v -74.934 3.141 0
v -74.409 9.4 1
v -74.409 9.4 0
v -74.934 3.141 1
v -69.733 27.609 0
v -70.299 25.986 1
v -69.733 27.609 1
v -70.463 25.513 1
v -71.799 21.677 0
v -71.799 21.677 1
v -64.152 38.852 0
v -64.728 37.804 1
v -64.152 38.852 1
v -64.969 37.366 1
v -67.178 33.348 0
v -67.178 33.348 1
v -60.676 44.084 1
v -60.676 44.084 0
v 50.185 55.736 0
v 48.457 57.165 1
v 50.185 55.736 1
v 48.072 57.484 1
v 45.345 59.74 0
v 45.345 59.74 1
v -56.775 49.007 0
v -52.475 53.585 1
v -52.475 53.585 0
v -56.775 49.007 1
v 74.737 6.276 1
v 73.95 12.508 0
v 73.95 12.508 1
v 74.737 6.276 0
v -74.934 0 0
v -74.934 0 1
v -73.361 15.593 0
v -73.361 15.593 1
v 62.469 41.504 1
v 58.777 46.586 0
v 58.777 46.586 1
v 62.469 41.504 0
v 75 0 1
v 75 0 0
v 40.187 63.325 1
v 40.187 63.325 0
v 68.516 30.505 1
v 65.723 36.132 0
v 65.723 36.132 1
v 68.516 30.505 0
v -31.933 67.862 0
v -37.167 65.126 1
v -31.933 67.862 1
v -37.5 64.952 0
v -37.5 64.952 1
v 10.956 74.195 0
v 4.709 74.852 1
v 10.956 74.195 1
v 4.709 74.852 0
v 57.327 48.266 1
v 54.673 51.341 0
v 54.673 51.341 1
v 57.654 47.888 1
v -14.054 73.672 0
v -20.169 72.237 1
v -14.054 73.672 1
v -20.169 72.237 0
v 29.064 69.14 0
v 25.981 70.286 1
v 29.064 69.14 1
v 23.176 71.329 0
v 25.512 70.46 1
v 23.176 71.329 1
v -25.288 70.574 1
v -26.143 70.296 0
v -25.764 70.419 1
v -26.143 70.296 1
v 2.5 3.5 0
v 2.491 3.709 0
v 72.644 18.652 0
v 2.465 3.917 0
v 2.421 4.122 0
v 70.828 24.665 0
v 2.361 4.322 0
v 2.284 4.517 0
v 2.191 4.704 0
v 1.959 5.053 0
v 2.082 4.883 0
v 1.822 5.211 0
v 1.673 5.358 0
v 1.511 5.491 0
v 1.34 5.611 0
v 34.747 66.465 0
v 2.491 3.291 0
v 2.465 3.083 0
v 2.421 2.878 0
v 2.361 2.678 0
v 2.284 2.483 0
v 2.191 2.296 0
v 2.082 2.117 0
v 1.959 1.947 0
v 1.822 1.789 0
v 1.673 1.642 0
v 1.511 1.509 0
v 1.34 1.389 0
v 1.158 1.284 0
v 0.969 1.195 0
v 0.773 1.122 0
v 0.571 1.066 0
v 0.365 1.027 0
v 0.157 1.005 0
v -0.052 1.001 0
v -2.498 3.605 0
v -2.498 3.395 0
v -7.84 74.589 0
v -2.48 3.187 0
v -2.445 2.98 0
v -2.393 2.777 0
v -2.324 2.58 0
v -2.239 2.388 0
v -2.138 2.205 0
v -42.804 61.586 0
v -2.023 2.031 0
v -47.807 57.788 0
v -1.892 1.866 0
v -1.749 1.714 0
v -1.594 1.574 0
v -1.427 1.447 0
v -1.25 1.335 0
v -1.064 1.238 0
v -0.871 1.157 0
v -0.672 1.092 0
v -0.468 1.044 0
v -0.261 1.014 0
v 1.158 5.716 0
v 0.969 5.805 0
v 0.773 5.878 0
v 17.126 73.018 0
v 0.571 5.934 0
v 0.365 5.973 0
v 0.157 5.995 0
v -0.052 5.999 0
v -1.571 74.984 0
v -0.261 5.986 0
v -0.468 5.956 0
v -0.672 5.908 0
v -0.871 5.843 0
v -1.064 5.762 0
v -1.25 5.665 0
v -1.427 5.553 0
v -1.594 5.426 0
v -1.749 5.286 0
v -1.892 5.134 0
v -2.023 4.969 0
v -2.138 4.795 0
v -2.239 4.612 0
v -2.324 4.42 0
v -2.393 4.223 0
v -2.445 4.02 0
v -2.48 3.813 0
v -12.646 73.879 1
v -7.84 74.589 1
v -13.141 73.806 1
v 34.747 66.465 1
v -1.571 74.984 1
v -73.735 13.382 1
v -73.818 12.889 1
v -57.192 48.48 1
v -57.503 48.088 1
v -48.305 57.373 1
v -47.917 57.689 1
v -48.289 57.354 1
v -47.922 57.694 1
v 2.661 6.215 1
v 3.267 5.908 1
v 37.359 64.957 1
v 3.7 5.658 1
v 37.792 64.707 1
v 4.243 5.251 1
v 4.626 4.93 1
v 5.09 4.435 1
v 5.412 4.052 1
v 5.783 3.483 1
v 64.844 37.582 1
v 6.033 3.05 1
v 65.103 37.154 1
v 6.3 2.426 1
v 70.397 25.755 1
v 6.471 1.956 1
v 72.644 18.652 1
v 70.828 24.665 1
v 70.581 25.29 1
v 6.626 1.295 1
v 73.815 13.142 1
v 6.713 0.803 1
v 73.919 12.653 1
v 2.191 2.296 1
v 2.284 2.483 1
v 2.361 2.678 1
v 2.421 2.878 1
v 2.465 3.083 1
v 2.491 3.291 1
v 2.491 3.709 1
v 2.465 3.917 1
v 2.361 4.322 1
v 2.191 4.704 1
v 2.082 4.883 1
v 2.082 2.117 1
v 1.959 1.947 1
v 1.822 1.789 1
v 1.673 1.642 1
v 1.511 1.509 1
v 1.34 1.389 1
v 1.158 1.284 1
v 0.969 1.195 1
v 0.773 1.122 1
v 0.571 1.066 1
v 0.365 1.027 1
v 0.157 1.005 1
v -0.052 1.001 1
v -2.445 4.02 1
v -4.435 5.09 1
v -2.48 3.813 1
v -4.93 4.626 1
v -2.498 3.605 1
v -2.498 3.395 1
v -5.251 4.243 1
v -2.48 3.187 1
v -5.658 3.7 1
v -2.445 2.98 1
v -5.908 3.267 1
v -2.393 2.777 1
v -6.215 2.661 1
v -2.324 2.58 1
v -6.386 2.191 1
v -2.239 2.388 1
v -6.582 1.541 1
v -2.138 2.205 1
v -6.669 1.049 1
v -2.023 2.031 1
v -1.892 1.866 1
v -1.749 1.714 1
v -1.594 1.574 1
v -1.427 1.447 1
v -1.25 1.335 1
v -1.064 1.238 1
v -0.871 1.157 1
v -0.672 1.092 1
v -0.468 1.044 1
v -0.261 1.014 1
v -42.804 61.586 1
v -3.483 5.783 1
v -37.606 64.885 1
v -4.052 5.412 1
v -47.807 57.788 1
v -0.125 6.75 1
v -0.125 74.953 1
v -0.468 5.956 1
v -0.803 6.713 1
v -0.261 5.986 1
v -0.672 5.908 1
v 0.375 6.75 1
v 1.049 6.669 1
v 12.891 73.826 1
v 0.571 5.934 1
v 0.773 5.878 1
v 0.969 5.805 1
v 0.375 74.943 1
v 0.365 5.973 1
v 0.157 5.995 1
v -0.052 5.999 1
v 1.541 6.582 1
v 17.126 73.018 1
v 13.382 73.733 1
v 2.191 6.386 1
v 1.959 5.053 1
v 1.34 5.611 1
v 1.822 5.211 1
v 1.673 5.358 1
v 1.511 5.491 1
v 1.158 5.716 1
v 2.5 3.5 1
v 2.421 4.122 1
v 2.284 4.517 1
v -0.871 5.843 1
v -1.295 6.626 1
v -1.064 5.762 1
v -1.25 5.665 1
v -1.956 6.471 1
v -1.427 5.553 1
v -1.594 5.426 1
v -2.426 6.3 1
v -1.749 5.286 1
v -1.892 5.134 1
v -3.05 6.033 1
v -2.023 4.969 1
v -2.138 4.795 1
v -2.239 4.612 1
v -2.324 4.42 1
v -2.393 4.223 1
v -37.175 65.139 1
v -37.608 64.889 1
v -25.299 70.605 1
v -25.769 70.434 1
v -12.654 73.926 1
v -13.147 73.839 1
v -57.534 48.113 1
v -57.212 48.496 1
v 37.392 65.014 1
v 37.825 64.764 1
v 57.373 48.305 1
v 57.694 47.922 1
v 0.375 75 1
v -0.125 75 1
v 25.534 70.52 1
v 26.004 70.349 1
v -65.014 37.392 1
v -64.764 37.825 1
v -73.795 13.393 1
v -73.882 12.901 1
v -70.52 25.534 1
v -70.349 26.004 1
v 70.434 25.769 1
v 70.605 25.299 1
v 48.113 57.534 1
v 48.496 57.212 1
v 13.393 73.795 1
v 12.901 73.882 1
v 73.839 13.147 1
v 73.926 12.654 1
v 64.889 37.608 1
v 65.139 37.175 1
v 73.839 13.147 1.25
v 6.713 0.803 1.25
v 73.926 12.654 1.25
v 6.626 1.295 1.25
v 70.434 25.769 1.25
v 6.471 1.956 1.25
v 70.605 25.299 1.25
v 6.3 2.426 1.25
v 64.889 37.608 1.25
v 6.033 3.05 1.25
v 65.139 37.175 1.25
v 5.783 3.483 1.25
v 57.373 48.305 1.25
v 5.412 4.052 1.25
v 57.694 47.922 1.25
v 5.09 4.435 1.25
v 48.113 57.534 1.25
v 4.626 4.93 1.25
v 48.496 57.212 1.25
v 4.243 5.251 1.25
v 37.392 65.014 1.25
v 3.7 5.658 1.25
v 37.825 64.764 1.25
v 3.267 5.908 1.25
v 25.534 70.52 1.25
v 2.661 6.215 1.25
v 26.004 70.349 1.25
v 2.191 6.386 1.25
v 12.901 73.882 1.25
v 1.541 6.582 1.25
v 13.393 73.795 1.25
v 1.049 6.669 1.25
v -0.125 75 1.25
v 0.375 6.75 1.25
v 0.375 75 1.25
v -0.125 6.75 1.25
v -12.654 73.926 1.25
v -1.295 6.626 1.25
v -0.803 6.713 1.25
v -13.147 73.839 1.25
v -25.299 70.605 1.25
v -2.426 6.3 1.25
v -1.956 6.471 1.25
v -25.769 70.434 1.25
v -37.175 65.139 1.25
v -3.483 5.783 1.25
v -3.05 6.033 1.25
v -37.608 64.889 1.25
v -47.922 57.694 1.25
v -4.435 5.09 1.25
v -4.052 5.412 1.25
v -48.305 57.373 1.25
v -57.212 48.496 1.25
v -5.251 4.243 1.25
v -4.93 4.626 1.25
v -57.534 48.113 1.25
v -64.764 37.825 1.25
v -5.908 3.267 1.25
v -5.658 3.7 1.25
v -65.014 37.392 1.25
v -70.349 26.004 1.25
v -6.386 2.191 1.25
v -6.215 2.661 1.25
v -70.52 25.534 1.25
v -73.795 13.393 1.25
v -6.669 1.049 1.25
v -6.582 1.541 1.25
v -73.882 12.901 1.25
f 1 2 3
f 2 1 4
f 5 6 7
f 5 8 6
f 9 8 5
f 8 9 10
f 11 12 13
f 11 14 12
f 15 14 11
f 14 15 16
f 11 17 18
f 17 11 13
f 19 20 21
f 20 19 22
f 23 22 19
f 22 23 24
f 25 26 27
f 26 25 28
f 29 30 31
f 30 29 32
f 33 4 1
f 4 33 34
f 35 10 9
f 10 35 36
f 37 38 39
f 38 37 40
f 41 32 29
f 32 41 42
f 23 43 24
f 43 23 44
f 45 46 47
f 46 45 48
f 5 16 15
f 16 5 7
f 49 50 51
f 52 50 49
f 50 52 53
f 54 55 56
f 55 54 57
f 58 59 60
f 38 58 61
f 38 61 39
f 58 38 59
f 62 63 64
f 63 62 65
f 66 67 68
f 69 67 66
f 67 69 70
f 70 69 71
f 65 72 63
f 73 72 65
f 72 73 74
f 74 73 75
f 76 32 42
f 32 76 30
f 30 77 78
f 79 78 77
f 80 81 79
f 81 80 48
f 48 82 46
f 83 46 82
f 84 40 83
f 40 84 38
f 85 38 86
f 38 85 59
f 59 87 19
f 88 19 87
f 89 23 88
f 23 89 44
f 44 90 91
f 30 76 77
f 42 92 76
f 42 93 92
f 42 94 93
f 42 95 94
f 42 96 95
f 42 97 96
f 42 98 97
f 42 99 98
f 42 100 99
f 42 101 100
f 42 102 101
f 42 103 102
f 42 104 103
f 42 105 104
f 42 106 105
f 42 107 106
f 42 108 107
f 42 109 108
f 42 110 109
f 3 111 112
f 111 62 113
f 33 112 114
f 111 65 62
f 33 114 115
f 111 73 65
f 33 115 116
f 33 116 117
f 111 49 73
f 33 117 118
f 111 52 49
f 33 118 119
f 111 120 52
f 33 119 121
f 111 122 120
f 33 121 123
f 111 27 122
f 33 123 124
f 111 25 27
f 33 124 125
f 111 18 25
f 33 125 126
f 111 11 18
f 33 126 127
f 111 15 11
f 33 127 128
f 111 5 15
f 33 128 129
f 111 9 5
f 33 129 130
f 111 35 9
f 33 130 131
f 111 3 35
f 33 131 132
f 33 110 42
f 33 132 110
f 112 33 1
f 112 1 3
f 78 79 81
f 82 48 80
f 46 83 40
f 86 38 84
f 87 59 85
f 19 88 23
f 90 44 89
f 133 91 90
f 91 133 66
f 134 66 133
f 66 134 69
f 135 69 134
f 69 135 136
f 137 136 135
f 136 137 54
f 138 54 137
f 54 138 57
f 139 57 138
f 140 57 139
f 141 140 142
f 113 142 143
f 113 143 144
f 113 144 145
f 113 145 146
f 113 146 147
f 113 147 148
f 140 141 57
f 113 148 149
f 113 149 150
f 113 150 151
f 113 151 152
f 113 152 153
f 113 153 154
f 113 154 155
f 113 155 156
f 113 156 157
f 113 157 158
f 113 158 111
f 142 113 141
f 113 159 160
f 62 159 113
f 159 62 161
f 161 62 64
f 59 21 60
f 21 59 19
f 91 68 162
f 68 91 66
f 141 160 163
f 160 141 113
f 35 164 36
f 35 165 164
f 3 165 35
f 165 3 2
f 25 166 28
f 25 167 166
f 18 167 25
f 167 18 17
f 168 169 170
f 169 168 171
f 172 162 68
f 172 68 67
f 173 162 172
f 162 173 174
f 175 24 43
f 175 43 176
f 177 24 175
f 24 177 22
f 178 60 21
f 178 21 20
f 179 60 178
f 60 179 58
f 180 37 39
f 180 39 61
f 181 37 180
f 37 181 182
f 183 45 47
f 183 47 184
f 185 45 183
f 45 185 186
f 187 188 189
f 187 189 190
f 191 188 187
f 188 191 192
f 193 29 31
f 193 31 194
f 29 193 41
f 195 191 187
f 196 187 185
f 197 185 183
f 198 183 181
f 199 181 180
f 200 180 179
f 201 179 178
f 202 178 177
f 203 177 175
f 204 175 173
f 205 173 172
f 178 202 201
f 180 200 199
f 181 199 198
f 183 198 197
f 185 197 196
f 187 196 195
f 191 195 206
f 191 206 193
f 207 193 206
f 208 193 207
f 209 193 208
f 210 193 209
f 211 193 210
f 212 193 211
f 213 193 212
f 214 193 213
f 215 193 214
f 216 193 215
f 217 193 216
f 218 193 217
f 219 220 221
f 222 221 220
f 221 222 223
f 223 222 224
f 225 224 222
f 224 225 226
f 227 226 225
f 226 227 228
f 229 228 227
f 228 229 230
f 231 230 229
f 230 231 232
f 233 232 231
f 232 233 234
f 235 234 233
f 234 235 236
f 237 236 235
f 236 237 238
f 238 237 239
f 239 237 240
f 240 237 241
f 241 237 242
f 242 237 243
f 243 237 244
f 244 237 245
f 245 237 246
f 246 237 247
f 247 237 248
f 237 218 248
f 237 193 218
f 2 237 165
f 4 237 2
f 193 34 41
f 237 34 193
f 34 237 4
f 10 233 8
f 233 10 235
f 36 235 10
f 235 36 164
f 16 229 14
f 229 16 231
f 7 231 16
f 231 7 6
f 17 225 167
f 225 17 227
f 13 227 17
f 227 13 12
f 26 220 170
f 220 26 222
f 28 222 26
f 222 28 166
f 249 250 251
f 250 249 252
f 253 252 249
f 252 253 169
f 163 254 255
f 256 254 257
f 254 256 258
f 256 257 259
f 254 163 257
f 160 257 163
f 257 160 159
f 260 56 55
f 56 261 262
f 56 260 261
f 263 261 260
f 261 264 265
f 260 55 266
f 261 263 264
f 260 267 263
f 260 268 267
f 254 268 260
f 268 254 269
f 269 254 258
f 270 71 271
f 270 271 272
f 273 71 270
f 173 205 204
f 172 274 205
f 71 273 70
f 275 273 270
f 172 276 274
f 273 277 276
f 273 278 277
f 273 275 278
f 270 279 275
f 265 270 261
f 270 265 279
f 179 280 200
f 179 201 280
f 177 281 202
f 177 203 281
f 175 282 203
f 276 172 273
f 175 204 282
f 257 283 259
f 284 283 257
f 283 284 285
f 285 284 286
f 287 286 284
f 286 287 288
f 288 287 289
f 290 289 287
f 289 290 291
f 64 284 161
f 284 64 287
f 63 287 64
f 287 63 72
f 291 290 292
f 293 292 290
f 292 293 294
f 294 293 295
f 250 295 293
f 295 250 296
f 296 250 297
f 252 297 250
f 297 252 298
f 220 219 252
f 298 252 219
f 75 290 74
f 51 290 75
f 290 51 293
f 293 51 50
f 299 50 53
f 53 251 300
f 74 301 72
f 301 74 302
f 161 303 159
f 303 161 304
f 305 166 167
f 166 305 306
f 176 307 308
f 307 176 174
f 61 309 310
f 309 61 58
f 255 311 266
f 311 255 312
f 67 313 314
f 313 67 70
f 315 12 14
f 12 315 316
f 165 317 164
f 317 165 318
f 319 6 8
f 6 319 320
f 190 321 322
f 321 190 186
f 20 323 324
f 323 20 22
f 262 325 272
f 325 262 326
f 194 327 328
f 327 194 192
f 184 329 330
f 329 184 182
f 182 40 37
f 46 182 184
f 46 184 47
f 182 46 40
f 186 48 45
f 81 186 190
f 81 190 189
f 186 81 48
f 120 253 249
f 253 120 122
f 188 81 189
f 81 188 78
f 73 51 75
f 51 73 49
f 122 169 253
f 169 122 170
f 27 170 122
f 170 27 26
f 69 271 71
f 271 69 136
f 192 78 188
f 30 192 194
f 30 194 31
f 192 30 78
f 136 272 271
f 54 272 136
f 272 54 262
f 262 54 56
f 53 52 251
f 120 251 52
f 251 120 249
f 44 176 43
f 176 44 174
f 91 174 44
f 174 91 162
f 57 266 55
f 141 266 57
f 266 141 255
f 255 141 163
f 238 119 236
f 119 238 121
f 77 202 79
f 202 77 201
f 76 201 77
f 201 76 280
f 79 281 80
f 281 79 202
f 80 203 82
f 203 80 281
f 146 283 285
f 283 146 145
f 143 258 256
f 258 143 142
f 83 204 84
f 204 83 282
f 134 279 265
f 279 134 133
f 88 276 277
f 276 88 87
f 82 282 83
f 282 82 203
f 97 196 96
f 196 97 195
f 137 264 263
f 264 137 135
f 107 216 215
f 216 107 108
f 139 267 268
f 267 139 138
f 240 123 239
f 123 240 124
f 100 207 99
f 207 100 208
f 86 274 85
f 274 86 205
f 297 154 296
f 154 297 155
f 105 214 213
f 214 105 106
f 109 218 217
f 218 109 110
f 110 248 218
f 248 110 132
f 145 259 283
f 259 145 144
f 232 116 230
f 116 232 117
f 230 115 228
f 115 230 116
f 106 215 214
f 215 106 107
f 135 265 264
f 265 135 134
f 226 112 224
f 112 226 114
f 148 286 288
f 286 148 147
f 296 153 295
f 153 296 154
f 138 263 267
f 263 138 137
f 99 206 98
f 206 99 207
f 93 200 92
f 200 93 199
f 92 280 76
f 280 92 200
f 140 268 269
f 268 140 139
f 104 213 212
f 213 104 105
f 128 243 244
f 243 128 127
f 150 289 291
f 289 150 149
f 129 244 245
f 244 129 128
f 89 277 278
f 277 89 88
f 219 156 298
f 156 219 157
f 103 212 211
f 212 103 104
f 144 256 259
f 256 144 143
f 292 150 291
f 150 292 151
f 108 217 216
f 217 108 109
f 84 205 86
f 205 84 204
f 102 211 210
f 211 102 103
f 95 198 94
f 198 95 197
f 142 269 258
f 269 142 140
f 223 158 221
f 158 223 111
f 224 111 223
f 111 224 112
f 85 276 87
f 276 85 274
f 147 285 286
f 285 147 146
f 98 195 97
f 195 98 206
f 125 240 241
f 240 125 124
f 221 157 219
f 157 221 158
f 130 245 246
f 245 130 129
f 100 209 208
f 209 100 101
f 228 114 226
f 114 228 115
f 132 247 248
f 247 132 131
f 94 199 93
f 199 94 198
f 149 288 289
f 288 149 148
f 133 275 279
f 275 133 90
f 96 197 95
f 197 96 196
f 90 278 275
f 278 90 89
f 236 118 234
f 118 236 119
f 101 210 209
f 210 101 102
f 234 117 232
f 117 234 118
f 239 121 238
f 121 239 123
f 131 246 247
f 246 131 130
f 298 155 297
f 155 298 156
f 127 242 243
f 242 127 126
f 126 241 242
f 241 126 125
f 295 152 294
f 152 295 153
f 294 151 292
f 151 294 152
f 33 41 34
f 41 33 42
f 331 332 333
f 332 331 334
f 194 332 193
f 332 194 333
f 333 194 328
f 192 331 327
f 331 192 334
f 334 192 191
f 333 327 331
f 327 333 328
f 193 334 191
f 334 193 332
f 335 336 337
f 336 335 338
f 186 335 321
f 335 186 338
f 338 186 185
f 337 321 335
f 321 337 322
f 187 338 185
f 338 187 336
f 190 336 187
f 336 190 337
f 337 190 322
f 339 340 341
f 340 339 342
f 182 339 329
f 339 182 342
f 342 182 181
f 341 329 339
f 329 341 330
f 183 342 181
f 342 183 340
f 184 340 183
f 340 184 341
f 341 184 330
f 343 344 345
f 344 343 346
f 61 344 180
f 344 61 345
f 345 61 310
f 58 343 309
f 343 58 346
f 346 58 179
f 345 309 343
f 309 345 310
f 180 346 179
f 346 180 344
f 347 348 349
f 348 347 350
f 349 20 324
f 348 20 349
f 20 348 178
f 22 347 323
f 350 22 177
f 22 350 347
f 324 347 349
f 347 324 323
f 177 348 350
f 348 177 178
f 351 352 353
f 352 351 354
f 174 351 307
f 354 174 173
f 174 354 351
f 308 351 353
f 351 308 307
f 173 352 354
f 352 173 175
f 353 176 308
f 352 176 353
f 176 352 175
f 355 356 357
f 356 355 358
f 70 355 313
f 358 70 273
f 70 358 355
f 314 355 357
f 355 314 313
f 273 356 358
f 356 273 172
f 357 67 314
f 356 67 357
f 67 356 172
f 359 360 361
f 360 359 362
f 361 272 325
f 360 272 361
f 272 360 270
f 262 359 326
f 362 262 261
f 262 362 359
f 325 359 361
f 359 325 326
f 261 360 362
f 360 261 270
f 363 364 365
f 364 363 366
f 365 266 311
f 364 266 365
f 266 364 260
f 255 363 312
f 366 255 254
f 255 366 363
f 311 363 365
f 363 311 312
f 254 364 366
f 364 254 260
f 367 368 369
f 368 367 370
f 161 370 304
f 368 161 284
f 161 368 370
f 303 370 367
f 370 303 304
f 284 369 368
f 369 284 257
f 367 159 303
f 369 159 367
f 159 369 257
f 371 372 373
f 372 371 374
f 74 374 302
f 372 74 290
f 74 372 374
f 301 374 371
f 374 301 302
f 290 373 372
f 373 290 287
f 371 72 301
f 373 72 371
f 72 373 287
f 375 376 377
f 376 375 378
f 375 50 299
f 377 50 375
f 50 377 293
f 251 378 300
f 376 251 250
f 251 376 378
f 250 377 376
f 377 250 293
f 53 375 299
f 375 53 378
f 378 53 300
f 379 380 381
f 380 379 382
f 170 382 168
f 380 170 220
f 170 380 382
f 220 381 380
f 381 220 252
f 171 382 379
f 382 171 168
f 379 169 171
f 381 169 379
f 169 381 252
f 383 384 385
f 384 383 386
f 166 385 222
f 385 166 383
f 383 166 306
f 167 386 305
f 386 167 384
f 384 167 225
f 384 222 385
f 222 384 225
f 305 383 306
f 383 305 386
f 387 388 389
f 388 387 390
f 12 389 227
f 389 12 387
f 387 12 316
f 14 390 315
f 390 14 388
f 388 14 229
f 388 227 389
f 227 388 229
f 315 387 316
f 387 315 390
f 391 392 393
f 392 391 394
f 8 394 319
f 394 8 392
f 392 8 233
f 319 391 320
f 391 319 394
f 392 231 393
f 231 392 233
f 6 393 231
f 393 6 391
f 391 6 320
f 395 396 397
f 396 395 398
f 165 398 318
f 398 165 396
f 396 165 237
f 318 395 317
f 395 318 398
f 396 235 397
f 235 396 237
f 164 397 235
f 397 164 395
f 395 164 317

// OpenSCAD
$fn = 75;
cm = 10;

width = 15*cm;
thickness = 1;

hole_d = .5*cm;
hole_offset = .35*cm;

difference() {
    linear_extrude(height=thickness) {
        circle(d=width);
    }

    // view hole
    translate([0, hole_offset, -1])
        cylinder(d=hole_d, h=3);

    translate([-(width/2), -(width/2),-1])
        cube([width,width/2,3]);
}

line_w = .25;
line_h = .25;
line_thickness = .5;
line_y = (hole_offset/2)+hole_d;


rotate([0,0,-90]) {
    angle_inc = 10;
    for (angle = [10:angle_inc:180-angle_inc]) {

        rotate([0,0,angle])
            translate([-(line_w/2), line_y, thickness])
                color("red") cube([line_thickness, (width/2)-line_y, line_h]);
    }
}
